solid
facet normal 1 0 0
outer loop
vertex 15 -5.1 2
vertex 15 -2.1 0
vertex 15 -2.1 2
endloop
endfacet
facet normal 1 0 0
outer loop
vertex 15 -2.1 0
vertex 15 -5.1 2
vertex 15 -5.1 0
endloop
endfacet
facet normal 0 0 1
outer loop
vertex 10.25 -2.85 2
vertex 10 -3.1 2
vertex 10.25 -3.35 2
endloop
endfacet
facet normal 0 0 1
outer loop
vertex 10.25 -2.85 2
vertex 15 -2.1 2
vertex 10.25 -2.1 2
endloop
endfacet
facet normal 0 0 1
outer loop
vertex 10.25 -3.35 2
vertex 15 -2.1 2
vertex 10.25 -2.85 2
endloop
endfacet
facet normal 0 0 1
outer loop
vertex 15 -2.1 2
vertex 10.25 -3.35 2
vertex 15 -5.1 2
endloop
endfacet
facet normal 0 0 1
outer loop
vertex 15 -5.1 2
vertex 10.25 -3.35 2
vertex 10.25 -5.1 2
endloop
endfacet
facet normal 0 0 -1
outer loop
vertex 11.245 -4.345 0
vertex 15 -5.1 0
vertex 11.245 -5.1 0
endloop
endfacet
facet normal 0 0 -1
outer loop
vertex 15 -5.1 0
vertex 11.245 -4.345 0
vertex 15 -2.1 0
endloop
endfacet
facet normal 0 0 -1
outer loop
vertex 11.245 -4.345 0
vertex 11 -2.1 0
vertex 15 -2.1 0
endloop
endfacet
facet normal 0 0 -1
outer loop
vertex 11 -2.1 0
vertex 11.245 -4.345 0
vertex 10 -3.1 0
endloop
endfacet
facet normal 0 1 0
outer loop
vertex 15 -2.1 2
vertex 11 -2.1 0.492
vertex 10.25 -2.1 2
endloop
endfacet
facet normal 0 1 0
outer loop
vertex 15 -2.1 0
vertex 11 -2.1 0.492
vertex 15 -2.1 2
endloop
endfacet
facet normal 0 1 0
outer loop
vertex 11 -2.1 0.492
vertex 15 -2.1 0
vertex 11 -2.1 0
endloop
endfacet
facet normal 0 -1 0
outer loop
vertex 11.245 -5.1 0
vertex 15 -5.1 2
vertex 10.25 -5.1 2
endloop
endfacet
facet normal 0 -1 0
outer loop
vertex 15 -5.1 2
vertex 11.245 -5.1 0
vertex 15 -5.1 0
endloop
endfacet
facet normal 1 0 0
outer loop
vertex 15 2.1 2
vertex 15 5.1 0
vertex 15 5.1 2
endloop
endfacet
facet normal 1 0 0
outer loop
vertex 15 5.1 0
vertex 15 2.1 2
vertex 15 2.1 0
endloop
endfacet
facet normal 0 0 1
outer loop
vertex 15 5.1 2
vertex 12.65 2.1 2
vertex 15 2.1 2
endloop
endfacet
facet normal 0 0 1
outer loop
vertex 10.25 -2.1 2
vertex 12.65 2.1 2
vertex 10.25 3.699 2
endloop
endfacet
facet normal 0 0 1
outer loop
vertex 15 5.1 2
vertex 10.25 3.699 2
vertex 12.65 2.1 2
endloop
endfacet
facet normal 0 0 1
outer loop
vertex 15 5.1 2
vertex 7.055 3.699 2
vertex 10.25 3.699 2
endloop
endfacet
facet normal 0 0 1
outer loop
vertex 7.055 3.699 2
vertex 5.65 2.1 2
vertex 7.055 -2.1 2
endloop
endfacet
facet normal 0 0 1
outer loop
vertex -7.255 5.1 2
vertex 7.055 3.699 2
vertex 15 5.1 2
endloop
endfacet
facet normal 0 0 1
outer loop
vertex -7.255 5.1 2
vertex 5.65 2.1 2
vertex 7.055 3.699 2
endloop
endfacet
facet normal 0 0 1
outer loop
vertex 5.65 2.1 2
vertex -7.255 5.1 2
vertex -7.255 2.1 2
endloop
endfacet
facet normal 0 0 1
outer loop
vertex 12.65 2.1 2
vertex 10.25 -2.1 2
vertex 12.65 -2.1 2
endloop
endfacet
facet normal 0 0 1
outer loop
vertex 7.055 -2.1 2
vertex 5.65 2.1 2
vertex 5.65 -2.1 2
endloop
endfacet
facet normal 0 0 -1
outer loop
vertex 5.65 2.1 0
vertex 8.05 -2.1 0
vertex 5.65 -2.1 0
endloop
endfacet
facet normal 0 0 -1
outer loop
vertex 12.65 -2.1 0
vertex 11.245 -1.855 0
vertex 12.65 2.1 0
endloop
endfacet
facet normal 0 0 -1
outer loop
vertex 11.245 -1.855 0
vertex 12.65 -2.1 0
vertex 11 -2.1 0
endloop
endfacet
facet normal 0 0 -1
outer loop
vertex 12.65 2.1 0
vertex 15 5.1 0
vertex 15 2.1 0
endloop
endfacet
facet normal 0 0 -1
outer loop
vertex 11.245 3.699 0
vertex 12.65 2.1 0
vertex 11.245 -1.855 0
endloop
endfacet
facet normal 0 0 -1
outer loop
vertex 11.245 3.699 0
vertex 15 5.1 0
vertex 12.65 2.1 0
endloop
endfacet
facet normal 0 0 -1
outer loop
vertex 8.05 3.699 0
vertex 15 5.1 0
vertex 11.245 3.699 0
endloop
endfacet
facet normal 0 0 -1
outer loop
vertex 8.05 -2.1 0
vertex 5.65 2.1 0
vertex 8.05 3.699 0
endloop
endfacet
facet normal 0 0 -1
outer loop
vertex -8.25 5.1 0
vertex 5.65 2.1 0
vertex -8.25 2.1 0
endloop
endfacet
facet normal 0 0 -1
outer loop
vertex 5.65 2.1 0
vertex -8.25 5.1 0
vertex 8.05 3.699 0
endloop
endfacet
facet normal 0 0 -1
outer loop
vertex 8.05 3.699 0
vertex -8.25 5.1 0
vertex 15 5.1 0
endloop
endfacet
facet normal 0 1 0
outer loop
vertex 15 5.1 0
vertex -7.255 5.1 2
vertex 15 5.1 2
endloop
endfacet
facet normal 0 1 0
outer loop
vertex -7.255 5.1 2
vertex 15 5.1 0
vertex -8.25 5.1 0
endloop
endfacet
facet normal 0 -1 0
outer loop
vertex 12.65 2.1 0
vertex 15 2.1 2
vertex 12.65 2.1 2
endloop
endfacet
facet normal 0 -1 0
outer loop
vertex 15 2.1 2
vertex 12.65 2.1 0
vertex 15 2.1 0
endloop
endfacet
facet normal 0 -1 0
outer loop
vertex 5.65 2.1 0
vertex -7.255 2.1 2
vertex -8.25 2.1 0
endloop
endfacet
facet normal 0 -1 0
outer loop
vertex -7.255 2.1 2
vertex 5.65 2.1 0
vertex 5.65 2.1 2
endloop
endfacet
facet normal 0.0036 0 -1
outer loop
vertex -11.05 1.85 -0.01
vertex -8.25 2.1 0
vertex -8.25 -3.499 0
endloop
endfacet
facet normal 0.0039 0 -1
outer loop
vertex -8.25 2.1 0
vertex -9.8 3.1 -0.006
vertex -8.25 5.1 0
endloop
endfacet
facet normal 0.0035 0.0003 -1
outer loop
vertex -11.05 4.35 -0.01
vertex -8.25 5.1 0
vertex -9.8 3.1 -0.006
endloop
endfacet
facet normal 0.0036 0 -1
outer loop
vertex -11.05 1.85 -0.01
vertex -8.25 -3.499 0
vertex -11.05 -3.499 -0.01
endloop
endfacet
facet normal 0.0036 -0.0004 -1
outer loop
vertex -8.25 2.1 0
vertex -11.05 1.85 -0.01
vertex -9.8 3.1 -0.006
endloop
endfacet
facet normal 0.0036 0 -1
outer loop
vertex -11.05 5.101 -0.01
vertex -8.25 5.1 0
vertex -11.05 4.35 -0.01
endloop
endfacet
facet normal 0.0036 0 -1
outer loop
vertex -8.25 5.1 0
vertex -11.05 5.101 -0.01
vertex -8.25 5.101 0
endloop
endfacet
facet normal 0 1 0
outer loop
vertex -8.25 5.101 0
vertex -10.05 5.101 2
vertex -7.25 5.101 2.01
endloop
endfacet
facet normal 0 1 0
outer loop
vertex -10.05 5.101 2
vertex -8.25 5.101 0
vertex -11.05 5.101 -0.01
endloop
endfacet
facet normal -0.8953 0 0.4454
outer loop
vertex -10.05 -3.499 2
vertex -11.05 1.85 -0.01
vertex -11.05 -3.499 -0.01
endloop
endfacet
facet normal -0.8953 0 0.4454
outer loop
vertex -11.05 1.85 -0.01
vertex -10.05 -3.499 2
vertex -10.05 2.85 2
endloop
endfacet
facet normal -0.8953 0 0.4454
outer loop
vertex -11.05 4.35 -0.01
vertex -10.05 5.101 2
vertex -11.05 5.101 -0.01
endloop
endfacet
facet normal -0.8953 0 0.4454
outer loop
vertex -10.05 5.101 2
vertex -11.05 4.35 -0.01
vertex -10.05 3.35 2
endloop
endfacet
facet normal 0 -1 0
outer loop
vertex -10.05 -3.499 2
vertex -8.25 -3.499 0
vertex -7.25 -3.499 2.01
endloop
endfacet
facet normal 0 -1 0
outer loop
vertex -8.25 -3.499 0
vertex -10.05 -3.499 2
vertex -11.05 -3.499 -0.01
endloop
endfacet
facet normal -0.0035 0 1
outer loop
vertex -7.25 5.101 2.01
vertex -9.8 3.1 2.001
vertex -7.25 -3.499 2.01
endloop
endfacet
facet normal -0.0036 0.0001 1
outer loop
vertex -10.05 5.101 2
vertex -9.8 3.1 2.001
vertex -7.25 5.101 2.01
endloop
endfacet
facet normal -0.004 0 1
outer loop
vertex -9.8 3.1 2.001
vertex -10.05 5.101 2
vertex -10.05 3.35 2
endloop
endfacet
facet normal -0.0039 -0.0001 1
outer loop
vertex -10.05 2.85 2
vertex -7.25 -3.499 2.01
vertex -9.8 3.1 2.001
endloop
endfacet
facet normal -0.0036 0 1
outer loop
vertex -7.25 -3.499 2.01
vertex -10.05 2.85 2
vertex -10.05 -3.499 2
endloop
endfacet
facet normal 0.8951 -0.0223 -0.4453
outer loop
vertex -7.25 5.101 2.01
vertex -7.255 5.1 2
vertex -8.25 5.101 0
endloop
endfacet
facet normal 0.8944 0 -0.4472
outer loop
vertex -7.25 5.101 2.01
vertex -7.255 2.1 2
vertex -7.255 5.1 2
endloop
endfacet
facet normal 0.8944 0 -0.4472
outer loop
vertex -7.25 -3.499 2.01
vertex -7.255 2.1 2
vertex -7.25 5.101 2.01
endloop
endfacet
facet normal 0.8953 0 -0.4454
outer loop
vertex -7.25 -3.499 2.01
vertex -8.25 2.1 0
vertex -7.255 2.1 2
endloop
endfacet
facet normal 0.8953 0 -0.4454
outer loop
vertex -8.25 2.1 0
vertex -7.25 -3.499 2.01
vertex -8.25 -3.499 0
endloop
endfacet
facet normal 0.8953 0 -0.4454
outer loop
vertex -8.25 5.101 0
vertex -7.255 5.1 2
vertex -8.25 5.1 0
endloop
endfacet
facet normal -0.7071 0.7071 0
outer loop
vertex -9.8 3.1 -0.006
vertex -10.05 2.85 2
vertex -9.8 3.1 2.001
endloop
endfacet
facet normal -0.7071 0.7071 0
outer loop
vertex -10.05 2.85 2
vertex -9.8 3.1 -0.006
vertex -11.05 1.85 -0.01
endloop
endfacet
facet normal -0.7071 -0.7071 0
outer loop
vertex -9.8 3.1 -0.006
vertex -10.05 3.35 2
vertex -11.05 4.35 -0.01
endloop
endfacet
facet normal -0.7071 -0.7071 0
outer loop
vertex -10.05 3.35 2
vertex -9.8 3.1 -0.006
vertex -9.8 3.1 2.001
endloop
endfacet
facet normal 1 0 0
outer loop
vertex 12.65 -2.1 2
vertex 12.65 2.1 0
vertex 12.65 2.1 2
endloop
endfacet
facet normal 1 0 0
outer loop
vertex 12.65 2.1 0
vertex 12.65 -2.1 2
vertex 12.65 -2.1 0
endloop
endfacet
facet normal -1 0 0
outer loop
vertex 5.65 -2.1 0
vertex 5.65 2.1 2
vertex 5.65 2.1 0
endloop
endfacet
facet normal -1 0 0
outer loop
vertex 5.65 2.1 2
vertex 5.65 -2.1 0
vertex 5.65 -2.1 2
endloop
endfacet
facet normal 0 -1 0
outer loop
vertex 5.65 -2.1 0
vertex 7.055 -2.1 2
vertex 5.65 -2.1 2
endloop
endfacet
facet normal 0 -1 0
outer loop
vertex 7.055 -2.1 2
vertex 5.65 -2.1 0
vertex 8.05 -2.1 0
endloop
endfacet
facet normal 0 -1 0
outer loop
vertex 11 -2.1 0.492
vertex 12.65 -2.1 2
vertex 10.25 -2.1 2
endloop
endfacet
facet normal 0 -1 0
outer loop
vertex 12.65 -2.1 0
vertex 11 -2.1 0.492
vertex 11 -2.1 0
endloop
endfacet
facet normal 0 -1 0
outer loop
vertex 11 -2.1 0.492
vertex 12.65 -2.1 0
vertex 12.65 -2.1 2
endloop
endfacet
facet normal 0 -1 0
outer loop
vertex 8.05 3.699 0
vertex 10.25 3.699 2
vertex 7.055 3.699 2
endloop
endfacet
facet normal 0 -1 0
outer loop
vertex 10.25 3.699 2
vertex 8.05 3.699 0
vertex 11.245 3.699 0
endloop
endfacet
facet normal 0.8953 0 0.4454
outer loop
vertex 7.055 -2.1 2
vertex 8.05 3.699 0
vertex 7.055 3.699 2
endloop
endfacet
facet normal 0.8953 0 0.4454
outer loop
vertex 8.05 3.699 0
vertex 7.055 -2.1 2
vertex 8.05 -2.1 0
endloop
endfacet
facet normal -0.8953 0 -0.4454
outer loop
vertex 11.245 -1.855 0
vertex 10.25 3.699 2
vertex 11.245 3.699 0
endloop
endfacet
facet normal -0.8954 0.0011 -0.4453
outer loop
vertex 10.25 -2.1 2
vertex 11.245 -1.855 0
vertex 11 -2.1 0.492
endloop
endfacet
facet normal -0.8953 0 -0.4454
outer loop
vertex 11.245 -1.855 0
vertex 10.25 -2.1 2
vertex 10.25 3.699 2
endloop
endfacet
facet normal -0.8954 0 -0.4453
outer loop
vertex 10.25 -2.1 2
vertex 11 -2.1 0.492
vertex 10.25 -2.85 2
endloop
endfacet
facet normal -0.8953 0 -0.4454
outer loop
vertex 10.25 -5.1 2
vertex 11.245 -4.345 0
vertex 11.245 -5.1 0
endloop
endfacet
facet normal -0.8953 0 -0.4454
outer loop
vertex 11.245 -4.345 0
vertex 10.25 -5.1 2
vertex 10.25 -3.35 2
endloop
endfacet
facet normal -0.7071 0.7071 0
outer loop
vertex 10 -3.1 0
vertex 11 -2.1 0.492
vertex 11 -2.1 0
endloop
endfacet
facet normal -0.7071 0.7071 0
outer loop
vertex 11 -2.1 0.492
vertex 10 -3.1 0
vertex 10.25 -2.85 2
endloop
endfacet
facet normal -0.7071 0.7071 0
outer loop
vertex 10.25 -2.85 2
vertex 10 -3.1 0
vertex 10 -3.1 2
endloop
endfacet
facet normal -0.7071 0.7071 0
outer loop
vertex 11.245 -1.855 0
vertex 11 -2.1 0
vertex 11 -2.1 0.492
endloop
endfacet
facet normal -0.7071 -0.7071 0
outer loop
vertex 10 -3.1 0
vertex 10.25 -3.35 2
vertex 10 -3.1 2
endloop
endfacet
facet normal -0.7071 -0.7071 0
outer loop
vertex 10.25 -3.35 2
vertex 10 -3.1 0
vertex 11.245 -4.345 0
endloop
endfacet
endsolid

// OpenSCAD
// file: track_config.scad
GAUGE = 16.5;
WHEELS_B = 14.55; // Back to back
WHEELS_K = 15.32; // Back to back + wheel inside gauge part thickness

// 1 - true, 0 - false
XXX_ANTIWARP = 0;

DDD = 0.1;

TRACK_WIDTH = 1.8;
TRACK_HEIGHT = 2.1;

TRACK_BASE_WIDTH = 4;
TRACK_BASE_JOINT_EXTRA_WIDTH = (7-TRACK_BASE_WIDTH) / 2;

TIE_LENGTH = 30;
TIE_WIDTH = 3;
TIE_HEIGHT = 2;
TIE_SPACING = 4.2; // TODO

JOINT_LENGTH = 4.2 + 3 / 2; // TIE_SPACING + TIE_WIDTH / 2;
JOINT_WIDTH = 3; // TODO
JOINT_RAIL_ANGLE = 30;
JOINT_SIZE = 2;

_JOINT_EFFECTIVE_LENGTH = 3 + 4.2 / 2; //TIE_WIDTH + TIE_SPACING / 2;
_TIE_STEP = TIE_WIDTH + TIE_SPACING;
_TIE_DX = TIE_LENGTH / 2;
_TRACK_BASE_DX = GAUGE / 2 - (TRACK_BASE_WIDTH - TRACK_WIDTH) / 2;
_TRACK_BASE_X_CENTRE = -_TRACK_BASE_DX-TRACK_BASE_WIDTH/2;
_TRACK_TOTAL_HEIGHT = TRACK_HEIGHT + TIE_HEIGHT;

RENDERING_ERROR = 0.01;
XXX_HEAD_WIDTH = 0.4;
// main file
include <track_config.scad>

// 1. just a joint base
drawJointBase();

////////////////////////////// API ///////////////////////////////////////////

/// One half of joint (base, no tracks).
module drawJointBase() {translate([0, TIE_SPACING/2]) whole_joint_base();};

/// One half of whole joint (base + tracks).
/// Error margin added.
module drawJointX() {translate([0, TIE_SPACING/2]) whole_joint();};

/// Tie, center of tie is in the origin
module drawTie() {
    translate([0, -TIE_WIDTH/2]) tie();
}

//////////////////////////////////////////////////////////////////////////////

//================== TIE ==================
module tie_with_base() {
    union() {
        tie();
        translate([_TRACK_BASE_DX, -TIE_SPACING, 0]) {
            cube([TRACK_BASE_WIDTH, TIE_SPACING, TIE_HEIGHT]);
        }
        translate([-_TRACK_BASE_DX-TRACK_BASE_WIDTH, -TIE_SPACING, 0]) {
            cube([TRACK_BASE_WIDTH, TIE_SPACING, TIE_HEIGHT]);
        }
    }
}

module tie() {
    translate([-_TIE_DX, 0, 0]) {
        cube([TIE_LENGTH, TIE_WIDTH, TIE_HEIGHT]);
    }
}

module tie_half() { // TODO
    cube([TIE_LENGTH / 2, TIE_WIDTH, TIE_HEIGHT]);
}

//================== JOINT =====================

module base_joint(dx) {
    __JOINT_INDENT = sin(JOINT_RAIL_ANGLE) * TIE_HEIGHT / 2;
    difference() {
        ///
        translate([0,0.001,0])
        rotate(90, [1, 0, 0])
        linear_extrude(height = JOINT_LENGTH + TIE_WIDTH + dx)
            polygon(points =
                [[-JOINT_WIDTH/2 - __JOINT_INDENT - dx, 0-0.01],
                 [JOINT_WIDTH/2 - __JOINT_INDENT  + dx, 0],
                 [JOINT_WIDTH/2 + __JOINT_INDENT  + dx, TIE_HEIGHT+0.01],
                 [-JOINT_WIDTH/2 + __JOINT_INDENT - dx, TIE_HEIGHT]]
                );
        // xxx
//        translate([-2-dx,-2,0])
//            rotate(45, [0,0,1])
//                translate([-JOINT_SIZE/2,-JOINT_SIZE/2,-0.01])
//                    cube([JOINT_SIZE,JOINT_SIZE,TIE_HEIGHT+0.02]);
        // TODO first is depth, second is distance along rail "axis"
        translate([-0.75-dx,-2,-0.01])
                rotate(135, [0,0,1])
                    cube([5,5,TIE_HEIGHT+0.02]);
    }
}

// starting from tie edge
module whole_joint() {
    _left_track_length = JOINT_LENGTH+TIE_WIDTH-DDD;
    _right_track_length = _TIE_STEP-JOINT_LENGTH-DDD;
    union() {
        // joint base
        whole_joint_base();
        // rendering error
        translate([0, TIE_WIDTH+RENDERING_ERROR])
            rotate([90])
                linear_extrude(2*RENDERING_ERROR)
                    trackPlusBaseProfile();
        // left track
        translate([0, TIE_WIDTH])
            rotate([90])
                linear_extrude(_left_track_length)
                    leftTrackProfile();
        // right track
        translate([0, TIE_WIDTH])
            rotate([90])
                linear_extrude(_right_track_length)
                    rightTrackProfile();
    }
}

module whole_joint_base()
{
    difference(){
    union() {
        // very first TIE in joint (small bit)
        translate([0, -_TIE_STEP]) {
            intersection() {
                tie();
                translate([_TRACK_BASE_DX + TRACK_BASE_WIDTH/2, 0, 0]){
                    cube(TIE_LENGTH, TIE_WIDTH, TIE_HEIGHT);
                };
            }
        };
        // second TIE in joint (bigger bit)
        intersection() {
            tie();
            translate([-(GAUGE/2+TRACK_BASE_WIDTH/5), 0, 0]){
                cube(TIE_LENGTH, TIE_WIDTH, TIE_HEIGHT);
            }
        }
        // joint base sample
        // TODO DDD
        translate([_TRACK_BASE_DX - TRACK_BASE_JOINT_EXTRA_WIDTH, -TIE_SPACING, 0]) {
            cube([TRACK_BASE_WIDTH + 2*TRACK_BASE_JOINT_EXTRA_WIDTH, _TIE_STEP, TIE_HEIGHT]);
        }
        // joint
        translate([_TRACK_BASE_X_CENTRE, TIE_WIDTH]) {
            base_joint(-DDD); // a bit smaller
        }
        // antiwrap
        if (XXX_ANTIWARP > 0) {
            translate([-_TRACK_BASE_DX-TRACK_BASE_WIDTH/2, -_JOINT_EFFECTIVE_LENGTH])
                antiwarp();
            translate([_TRACK_BASE_DX+TRACK_BASE_WIDTH, -_JOINT_EFFECTIVE_LENGTH])
                antiwarp();
        }
    };
        // anti-joint
        translate([-_TRACK_BASE_X_CENTRE, -_TIE_STEP]) {
            //translate([-0.005, 0, -0.001]) scale(1.01)
                rotate(180, [0, 0, 1]) base_joint(DDD); // a bit larger
        };
    }
}

/////
module antiwarp() {
    _length = 5;
    _r = 10; // track dir
    _rx = 15;
    union() {
        translate([-XXX_HEAD_WIDTH/2, -_length-_r])
            cube([XXX_HEAD_WIDTH+0.1, _length+RENDERING_ERROR+_r, TIE_HEIGHT/2]);
        translate([0, -_length-_r]) scale([_rx/_r,1])
            cylinder(TIE_HEIGHT/2,_r,_r);
    }
}

//===================== TRACK ============================
module trackPlusBaseProfile(DrawTrackFlag = 1+2+4+8) {
    union() {
        trackProfile(DrawTrackFlag);
        trackBaseProfile(DrawTrackFlag);
    }
}

module trackBaseProfile(DrawTrackFlag=4+8) {
    union() {
        // left profile
        if (floor(DrawTrackFlag/4)%2==1) {
            translate([-TRACK_BASE_WIDTH-_TRACK_BASE_DX,0])
                square([TRACK_BASE_WIDTH,
                        TIE_HEIGHT + RENDERING_ERROR]);
        }
        // right profile
        if (floor(DrawTrackFlag/8)%2==1) {
            translate([_TRACK_BASE_DX,0])
                square([TRACK_BASE_WIDTH,
                        TIE_HEIGHT + RENDERING_ERROR]);
        }
    }
}

module trackProfile(DrawTrackFlag) {
    union() {
        // left profile
        if (DrawTrackFlag%2==1){
            leftTrackProfile();
        }
        // right profile
        if (floor(DrawTrackFlag/2)%2==1){
            rightTrackProfile();
        }
    }
}

module leftTrackProfile() {
    translate([-TRACK_WIDTH-GAUGE/2,TIE_HEIGHT])
        square([TRACK_WIDTH, TRACK_HEIGHT]);
}

module rightTrackProfile() {
    mirror()
        leftTrackProfile();
}
